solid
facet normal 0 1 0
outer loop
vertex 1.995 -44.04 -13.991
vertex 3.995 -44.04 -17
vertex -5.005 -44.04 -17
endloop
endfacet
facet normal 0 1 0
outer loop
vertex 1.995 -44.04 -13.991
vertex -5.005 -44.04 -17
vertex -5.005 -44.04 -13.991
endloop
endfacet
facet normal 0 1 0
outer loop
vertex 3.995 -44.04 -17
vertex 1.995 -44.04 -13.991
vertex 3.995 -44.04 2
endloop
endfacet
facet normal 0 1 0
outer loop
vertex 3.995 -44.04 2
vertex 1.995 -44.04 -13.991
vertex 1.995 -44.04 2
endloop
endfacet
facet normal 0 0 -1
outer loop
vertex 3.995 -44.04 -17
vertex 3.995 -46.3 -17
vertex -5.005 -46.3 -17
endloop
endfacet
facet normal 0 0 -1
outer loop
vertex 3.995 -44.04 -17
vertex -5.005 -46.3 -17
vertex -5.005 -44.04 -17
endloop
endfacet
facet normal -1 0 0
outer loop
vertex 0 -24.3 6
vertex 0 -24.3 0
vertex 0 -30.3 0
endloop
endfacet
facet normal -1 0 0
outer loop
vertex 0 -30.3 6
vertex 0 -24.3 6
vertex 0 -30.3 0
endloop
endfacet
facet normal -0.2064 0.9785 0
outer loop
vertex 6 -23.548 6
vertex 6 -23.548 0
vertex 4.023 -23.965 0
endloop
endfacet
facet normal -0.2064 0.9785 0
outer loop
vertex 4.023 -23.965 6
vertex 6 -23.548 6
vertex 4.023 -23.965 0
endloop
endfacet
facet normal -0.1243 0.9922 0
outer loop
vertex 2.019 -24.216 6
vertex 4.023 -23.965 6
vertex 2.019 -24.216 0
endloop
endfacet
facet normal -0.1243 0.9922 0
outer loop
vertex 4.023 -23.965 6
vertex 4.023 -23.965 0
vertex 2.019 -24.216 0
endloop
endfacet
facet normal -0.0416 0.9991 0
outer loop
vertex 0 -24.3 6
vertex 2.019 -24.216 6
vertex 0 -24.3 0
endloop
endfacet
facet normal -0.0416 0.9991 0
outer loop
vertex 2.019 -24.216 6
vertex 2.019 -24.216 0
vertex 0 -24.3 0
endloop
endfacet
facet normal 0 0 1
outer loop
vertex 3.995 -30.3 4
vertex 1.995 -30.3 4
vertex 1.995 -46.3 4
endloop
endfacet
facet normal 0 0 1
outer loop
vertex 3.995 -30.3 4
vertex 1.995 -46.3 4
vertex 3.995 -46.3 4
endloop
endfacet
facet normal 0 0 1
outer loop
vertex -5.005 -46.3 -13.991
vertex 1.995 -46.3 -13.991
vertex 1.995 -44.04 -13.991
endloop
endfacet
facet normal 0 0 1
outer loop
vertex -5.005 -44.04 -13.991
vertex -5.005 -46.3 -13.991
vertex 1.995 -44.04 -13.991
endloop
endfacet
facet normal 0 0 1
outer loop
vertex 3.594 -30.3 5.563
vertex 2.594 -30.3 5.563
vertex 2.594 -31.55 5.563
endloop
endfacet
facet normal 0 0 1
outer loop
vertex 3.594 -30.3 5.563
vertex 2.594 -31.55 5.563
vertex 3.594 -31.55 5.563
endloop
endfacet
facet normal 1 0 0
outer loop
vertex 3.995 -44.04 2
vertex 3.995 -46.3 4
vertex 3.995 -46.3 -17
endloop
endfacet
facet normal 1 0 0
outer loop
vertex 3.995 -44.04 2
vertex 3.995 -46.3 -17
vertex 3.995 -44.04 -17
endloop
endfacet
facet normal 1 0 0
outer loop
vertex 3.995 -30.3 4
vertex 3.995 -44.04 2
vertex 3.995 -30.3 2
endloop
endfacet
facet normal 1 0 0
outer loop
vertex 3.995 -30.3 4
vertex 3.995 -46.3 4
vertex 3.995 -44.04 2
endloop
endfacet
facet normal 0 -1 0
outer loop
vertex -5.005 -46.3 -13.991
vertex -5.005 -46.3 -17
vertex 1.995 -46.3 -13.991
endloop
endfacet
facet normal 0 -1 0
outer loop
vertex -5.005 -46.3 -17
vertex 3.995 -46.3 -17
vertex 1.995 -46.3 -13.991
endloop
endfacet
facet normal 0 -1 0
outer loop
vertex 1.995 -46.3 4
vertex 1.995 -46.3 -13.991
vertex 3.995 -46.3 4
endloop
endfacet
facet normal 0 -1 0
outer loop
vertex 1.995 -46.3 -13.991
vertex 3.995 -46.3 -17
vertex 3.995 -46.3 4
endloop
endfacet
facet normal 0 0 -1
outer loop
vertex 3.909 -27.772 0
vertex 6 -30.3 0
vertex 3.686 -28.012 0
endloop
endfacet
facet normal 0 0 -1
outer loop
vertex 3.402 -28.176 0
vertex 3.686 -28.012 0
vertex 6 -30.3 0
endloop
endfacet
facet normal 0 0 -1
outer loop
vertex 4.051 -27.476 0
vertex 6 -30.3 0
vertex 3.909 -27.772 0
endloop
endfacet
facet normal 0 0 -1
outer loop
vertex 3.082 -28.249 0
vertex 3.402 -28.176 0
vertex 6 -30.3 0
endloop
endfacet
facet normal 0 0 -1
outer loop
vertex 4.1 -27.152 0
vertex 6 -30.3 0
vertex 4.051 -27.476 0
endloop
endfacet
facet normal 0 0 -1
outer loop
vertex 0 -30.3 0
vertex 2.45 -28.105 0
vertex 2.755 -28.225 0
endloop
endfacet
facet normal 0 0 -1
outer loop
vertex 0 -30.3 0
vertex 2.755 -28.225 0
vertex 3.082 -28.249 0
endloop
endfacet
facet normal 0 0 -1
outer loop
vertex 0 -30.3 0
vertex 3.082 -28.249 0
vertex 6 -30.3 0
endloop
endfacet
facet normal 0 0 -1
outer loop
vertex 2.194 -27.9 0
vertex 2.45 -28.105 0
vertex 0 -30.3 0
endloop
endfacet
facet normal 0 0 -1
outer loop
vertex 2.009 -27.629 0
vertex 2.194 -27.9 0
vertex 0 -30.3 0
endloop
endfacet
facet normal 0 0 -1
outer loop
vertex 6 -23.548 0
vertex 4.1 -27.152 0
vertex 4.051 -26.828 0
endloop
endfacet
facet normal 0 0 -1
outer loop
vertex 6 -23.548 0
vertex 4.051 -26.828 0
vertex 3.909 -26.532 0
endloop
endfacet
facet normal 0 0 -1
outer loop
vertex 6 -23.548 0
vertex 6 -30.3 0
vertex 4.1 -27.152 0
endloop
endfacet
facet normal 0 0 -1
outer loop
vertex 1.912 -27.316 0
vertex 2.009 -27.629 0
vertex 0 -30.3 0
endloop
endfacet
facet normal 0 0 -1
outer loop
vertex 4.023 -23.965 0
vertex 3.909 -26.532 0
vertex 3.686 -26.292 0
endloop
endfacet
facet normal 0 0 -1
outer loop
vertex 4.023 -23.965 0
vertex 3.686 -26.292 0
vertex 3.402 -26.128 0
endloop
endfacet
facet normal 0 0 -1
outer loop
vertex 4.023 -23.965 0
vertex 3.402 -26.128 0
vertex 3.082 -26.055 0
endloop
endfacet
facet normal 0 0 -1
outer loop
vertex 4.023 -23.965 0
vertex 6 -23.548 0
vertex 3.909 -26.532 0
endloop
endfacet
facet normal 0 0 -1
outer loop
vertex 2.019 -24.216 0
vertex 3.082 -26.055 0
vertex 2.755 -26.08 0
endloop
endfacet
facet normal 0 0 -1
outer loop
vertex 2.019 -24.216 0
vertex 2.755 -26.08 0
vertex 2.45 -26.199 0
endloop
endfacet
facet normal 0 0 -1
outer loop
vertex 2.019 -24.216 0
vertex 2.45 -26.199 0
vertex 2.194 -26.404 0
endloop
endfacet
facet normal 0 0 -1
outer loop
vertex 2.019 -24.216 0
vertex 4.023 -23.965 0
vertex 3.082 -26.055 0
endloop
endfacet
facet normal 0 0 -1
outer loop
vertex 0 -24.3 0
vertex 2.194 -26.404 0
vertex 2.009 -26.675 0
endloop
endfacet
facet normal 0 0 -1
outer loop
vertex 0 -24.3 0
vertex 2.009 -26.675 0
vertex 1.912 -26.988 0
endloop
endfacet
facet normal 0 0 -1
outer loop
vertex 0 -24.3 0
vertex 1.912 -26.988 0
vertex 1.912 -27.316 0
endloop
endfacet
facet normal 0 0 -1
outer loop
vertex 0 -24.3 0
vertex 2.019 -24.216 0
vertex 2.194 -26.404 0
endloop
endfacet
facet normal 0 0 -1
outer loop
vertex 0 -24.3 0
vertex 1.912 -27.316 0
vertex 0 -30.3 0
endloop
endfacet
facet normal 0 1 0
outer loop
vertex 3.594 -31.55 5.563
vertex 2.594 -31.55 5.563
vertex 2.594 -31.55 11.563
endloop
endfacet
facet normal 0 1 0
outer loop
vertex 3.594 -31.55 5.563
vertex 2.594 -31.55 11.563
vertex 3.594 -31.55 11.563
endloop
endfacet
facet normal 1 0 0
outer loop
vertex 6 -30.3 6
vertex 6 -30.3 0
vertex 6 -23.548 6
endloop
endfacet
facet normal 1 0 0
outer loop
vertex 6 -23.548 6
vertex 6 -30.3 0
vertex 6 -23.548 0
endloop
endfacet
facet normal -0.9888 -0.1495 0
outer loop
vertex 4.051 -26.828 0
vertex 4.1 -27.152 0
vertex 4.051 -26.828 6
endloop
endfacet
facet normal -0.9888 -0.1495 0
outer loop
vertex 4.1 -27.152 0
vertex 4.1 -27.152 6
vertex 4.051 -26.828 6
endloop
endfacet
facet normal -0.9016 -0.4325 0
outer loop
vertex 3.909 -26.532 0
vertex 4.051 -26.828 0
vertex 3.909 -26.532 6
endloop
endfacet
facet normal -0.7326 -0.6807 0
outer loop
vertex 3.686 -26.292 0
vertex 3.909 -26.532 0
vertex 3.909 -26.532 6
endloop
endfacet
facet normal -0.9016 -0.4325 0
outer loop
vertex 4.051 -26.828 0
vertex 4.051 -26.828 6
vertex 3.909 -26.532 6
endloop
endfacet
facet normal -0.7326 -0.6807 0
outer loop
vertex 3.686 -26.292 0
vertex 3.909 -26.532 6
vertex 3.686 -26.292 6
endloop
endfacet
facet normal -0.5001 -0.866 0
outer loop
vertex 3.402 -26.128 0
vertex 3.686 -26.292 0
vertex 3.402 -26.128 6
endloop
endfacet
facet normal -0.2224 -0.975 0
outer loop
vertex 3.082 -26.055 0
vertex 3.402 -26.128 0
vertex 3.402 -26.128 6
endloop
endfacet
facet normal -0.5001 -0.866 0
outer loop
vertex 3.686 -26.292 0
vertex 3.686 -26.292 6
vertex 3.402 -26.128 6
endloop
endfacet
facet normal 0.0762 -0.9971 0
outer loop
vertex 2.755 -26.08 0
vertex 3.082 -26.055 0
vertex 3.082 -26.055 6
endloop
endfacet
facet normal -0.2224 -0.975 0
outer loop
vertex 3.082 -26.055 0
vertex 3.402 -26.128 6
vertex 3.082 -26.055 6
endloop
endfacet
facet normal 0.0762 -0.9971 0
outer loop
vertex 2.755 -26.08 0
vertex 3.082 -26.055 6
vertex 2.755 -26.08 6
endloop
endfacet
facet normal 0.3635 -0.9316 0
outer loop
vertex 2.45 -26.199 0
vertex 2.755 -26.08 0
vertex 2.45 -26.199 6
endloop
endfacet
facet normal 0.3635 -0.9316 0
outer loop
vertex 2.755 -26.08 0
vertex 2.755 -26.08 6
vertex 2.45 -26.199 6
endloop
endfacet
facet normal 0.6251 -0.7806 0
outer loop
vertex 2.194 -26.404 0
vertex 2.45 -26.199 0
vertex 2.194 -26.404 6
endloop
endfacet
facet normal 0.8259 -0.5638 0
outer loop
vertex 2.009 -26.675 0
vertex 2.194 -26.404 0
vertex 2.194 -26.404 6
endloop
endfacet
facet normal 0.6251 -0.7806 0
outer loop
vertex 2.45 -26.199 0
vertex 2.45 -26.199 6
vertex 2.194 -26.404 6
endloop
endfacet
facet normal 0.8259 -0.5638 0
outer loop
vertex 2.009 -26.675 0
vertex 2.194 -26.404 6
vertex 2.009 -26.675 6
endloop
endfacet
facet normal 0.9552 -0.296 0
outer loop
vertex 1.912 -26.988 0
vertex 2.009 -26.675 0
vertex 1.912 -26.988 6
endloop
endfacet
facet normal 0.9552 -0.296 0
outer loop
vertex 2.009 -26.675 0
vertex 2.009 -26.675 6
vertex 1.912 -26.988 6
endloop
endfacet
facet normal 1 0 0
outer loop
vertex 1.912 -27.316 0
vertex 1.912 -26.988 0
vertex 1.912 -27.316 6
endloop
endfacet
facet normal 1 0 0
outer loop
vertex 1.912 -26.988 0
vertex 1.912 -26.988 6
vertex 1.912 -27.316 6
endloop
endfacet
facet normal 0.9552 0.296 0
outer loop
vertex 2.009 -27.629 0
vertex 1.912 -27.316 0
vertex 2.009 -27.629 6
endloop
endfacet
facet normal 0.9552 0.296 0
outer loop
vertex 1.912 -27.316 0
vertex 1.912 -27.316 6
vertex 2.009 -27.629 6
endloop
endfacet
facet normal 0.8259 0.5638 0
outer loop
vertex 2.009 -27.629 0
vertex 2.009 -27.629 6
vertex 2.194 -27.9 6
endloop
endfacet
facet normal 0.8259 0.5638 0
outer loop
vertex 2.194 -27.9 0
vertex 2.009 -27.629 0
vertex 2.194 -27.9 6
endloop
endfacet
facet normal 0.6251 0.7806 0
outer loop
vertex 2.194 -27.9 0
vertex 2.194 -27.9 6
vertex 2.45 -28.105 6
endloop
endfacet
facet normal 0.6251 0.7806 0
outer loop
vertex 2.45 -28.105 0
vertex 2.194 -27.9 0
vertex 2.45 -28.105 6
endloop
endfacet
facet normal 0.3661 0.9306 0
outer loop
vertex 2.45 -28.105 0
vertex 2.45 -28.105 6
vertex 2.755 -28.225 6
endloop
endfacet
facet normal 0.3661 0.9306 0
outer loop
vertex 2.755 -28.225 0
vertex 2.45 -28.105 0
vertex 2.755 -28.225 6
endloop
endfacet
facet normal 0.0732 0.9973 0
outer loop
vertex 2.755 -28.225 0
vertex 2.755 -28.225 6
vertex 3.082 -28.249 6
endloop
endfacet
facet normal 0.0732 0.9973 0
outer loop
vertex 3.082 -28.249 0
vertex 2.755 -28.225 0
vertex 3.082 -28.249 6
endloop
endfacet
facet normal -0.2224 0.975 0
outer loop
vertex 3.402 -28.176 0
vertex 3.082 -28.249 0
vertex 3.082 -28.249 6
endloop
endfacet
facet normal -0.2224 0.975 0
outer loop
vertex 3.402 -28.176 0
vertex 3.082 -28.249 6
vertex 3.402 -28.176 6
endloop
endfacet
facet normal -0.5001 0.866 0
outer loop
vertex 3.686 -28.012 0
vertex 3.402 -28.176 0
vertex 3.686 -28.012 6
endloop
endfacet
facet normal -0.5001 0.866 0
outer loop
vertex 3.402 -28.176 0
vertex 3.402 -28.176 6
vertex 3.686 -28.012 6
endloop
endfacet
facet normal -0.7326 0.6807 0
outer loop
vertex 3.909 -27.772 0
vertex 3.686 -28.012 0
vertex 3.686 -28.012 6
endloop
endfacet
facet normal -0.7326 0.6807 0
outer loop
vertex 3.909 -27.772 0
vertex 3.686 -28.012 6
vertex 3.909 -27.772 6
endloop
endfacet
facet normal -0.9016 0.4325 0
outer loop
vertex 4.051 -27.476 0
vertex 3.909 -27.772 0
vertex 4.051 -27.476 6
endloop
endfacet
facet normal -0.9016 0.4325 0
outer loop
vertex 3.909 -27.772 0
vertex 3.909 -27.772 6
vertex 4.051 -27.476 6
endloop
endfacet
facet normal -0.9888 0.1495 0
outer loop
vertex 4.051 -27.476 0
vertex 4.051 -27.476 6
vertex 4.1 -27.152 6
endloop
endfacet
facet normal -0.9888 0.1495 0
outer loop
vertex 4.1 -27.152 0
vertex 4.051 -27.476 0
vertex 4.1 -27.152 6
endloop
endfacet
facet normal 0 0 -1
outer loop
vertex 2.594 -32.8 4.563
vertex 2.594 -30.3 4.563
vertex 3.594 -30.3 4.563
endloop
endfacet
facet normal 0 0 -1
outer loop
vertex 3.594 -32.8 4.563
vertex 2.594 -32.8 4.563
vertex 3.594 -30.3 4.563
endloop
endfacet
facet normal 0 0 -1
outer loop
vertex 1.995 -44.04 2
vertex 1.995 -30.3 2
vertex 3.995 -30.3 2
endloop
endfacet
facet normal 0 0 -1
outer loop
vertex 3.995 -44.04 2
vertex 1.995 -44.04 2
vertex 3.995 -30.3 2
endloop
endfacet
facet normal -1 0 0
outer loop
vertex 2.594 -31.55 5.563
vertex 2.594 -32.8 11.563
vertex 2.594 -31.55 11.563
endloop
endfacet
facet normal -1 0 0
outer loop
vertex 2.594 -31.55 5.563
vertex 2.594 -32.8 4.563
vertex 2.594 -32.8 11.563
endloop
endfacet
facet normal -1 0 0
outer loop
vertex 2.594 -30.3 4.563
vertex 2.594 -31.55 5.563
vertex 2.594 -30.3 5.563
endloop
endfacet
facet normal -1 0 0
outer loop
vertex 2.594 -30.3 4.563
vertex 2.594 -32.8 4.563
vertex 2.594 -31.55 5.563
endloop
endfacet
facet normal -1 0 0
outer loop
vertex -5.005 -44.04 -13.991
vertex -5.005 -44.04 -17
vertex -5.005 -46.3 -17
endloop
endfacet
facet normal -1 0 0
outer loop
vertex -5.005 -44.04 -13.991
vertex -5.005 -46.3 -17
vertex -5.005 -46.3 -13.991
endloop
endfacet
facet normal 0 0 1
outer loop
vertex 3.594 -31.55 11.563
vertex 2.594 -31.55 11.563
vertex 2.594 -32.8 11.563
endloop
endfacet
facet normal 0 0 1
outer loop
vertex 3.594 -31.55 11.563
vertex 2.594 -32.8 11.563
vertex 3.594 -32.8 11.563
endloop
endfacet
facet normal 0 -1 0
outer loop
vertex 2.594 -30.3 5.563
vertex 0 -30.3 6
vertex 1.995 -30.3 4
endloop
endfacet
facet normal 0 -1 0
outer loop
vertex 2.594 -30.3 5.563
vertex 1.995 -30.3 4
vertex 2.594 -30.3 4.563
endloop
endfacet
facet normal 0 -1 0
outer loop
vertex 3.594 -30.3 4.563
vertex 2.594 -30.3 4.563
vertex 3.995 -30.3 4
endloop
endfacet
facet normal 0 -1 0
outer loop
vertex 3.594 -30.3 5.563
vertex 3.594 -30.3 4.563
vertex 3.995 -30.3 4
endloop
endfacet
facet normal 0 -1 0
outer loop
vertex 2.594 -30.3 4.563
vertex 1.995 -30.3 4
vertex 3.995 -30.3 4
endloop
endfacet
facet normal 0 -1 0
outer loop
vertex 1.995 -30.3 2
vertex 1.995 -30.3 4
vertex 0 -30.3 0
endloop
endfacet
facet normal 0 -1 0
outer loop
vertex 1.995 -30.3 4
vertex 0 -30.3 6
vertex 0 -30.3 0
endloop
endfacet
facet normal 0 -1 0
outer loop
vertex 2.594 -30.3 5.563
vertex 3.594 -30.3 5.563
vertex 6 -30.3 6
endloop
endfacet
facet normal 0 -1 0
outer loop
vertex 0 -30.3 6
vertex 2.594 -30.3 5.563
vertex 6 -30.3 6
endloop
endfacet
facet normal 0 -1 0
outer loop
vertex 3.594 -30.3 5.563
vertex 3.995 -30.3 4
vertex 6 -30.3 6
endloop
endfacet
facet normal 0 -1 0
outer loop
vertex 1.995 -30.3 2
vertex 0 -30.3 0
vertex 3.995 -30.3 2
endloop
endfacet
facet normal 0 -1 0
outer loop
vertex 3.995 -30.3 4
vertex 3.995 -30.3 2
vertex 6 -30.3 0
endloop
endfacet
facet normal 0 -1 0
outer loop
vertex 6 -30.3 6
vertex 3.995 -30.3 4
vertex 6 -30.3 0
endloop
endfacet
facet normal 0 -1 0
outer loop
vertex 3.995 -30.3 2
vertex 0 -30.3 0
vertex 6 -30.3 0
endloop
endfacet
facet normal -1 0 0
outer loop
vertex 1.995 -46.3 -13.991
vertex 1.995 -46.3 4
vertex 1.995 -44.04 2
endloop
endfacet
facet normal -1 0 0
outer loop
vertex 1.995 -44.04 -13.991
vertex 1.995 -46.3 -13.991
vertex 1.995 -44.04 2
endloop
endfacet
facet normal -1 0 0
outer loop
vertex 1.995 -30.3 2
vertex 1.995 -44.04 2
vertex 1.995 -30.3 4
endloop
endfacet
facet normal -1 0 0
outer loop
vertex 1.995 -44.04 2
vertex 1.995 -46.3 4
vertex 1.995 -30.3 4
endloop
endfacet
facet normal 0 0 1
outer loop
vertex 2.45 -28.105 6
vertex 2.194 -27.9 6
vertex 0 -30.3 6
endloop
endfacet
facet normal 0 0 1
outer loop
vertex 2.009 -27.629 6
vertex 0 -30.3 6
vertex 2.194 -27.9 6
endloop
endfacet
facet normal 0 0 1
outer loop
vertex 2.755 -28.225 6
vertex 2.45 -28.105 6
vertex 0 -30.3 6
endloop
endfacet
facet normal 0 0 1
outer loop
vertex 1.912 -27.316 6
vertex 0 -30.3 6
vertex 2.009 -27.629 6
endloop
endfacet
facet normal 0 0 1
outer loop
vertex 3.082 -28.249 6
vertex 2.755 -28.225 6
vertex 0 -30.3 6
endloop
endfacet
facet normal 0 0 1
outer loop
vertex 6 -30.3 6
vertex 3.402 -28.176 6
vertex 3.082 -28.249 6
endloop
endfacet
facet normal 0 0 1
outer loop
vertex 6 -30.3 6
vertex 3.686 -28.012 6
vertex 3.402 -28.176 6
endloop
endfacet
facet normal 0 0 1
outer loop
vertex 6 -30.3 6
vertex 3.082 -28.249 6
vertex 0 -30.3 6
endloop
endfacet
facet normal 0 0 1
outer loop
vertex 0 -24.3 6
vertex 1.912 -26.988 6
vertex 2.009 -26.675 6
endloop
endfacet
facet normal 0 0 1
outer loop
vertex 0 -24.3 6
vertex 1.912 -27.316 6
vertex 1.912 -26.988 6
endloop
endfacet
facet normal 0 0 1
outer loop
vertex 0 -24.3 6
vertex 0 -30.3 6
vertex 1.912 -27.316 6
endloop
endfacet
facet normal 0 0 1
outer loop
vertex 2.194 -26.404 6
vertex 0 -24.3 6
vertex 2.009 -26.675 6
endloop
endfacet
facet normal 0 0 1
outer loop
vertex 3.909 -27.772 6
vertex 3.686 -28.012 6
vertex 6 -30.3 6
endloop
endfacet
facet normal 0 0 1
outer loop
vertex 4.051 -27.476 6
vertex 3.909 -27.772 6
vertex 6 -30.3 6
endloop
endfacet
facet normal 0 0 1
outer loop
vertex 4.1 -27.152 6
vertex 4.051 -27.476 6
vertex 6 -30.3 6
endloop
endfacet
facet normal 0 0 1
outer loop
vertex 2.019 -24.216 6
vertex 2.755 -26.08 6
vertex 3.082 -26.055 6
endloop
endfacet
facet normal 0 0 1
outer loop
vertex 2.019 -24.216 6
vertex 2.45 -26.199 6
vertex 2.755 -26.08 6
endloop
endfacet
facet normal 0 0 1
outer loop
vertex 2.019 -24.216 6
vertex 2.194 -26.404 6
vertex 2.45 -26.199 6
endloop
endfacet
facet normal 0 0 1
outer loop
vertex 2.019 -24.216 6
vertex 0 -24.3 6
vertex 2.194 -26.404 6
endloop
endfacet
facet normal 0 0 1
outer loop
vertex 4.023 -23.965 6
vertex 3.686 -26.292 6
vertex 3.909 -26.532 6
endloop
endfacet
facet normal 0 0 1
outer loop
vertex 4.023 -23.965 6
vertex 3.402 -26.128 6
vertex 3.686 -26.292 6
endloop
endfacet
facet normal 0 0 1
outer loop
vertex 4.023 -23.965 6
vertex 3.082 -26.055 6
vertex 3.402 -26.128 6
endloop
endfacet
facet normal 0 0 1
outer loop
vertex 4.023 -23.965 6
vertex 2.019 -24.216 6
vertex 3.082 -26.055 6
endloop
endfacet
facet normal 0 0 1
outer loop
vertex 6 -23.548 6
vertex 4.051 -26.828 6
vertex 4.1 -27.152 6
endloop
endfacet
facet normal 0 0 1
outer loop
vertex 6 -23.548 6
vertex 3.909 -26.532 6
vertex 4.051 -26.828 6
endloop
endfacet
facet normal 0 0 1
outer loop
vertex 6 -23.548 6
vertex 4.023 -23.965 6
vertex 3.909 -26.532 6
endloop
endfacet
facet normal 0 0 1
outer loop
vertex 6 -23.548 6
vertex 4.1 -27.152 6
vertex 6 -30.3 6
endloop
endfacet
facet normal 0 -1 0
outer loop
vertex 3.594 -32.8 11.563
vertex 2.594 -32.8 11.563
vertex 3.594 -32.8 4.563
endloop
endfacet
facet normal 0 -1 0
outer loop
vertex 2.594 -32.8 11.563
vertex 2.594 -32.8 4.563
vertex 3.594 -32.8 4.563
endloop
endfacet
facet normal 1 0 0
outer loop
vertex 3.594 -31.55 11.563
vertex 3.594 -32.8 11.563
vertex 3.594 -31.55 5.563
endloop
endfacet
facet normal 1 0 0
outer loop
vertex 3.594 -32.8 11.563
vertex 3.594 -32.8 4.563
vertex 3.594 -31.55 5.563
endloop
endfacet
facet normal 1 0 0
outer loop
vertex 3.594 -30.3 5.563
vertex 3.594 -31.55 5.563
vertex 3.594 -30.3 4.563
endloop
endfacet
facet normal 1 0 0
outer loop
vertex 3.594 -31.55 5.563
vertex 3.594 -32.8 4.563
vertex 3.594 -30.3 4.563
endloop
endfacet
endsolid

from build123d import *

# Parameters (mm, degrees)
SKETCH1_R           = 1.1
BOSS_EXTRUDE1_DEPTH = 6
SKETCH2_W           = 2
SKETCH2_H           = 2
BOSS_EXTRUDE2_DEPTH = 16
SKETCH4_W           = 2
SKETCH4_H           = 11.994112908
BOSS_EXTRUDE4_DEPTH = 19
SKETCH5_W           = 1
SKETCH5_H           = 1
BOSS_EXTRUDE5_DEPTH = 2.5
SKETCH6_W           = 1
SKETCH6_H           = 1.25
BOSS_EXTRUDE6_DEPTH = 6
SKETCH7_W           = 3.009444154
SKETCH7_H           = 11.994112908
BOSS_EXTRUDE7_DEPTH = 7
SKETCH8_R           = 1.1
BOSS_EXTRUDE8_DEPTH = 1
SKETCH9_R           = 1.1
CUT_EXTRUDE1_DEPTH  = 10
SKETCH10_W          = 19
SKETCH10_H          = 9.734535385
CUT_EXTRUDE2_DEPTH  = 10


with BuildPart() as part:
    # Sketch1 → Boss-Extrude1 (new body)
    with BuildSketch(Plane.XY):
        with BuildLine():
            Line((0, -24.3), (0, -30.3))
            Line((0, -30.3), (6, -30.3))
            Line((6, -30.3), (6, -23.547611344))
            ThreePointArc((6, -23.547611344), (3.023495026, -24.111169151), (0, -24.3))
        make_face()
        with Locations((3, -27.152103588)):
            Circle(SKETCH1_R, mode=Mode.SUBTRACT)
    extrude(amount=BOSS_EXTRUDE1_DEPTH)

    # Sketch2 → Boss-Extrude2 (add)
    with BuildSketch(Plane.XZ.offset(30.3)):
        with Locations((2.994992787, 3)):
            Rectangle(SKETCH2_W, SKETCH2_H)
    extrude(amount=BOSS_EXTRUDE2_DEPTH)

    # Sketch4 → Boss-Extrude4 (add)
    with BuildSketch(Plane(origin=(0, 0, 2), x_dir=(-1, 0, 0), z_dir=(0, 0, -1))):
        with Locations((-2.994992787, -40.302943546)):
            Rectangle(SKETCH4_W, SKETCH4_H)
    extrude(amount=BOSS_EXTRUDE4_DEPTH)

    # Sketch5 → Boss-Extrude5 (add)
    with BuildSketch(Plane.XZ.offset(30.3)):
        with Locations((3.093546014, 5.062561083)):
            Rectangle(SKETCH5_W, SKETCH5_H)
    extrude(amount=BOSS_EXTRUDE5_DEPTH)

    # Sketch6 → Boss-Extrude6 (add)
    with BuildSketch(Plane.XY.offset(5.562561083)):
        with Locations((3.093546014, -32.175)):
            Rectangle(SKETCH6_W, SKETCH6_H)
    extrude(amount=BOSS_EXTRUDE6_DEPTH)

    # Sketch7 → Boss-Extrude7 (add)
    with BuildSketch(Plane.ZY.offset(-1.994992787)):
        with Locations((-15.495277923, -40.302943546)):
            Rectangle(SKETCH7_W, SKETCH7_H)
    extrude(amount=BOSS_EXTRUDE7_DEPTH)

    # Sketch8 → Boss-Extrude8 (add)
    with BuildSketch(Plane(origin=(0, 0, 0), x_dir=(-1, 0, 0), z_dir=(0, 0, -1))):
        with Locations((-3, -27.152103588)):
            Circle(SKETCH8_R)
    extrude(amount=-BOSS_EXTRUDE8_DEPTH)

    # Sketch9 → Cut-Extrude1 (cut)
    with BuildSketch(Plane.XY.offset(6)):
        with Locations((3, -27.152103588)):
            Circle(SKETCH9_R)
    extrude(amount=-CUT_EXTRUDE1_DEPTH, mode=Mode.SUBTRACT)

    # Sketch10 → Cut-Extrude2 (cut)
    with BuildSketch(Plane.ZY.offset(5.005007213)):
        with Locations((-7.5, -39.173154784)):
            Rectangle(SKETCH10_W, SKETCH10_H)
    extrude(amount=-CUT_EXTRUDE2_DEPTH, mode=Mode.SUBTRACT)


solid = part.part
